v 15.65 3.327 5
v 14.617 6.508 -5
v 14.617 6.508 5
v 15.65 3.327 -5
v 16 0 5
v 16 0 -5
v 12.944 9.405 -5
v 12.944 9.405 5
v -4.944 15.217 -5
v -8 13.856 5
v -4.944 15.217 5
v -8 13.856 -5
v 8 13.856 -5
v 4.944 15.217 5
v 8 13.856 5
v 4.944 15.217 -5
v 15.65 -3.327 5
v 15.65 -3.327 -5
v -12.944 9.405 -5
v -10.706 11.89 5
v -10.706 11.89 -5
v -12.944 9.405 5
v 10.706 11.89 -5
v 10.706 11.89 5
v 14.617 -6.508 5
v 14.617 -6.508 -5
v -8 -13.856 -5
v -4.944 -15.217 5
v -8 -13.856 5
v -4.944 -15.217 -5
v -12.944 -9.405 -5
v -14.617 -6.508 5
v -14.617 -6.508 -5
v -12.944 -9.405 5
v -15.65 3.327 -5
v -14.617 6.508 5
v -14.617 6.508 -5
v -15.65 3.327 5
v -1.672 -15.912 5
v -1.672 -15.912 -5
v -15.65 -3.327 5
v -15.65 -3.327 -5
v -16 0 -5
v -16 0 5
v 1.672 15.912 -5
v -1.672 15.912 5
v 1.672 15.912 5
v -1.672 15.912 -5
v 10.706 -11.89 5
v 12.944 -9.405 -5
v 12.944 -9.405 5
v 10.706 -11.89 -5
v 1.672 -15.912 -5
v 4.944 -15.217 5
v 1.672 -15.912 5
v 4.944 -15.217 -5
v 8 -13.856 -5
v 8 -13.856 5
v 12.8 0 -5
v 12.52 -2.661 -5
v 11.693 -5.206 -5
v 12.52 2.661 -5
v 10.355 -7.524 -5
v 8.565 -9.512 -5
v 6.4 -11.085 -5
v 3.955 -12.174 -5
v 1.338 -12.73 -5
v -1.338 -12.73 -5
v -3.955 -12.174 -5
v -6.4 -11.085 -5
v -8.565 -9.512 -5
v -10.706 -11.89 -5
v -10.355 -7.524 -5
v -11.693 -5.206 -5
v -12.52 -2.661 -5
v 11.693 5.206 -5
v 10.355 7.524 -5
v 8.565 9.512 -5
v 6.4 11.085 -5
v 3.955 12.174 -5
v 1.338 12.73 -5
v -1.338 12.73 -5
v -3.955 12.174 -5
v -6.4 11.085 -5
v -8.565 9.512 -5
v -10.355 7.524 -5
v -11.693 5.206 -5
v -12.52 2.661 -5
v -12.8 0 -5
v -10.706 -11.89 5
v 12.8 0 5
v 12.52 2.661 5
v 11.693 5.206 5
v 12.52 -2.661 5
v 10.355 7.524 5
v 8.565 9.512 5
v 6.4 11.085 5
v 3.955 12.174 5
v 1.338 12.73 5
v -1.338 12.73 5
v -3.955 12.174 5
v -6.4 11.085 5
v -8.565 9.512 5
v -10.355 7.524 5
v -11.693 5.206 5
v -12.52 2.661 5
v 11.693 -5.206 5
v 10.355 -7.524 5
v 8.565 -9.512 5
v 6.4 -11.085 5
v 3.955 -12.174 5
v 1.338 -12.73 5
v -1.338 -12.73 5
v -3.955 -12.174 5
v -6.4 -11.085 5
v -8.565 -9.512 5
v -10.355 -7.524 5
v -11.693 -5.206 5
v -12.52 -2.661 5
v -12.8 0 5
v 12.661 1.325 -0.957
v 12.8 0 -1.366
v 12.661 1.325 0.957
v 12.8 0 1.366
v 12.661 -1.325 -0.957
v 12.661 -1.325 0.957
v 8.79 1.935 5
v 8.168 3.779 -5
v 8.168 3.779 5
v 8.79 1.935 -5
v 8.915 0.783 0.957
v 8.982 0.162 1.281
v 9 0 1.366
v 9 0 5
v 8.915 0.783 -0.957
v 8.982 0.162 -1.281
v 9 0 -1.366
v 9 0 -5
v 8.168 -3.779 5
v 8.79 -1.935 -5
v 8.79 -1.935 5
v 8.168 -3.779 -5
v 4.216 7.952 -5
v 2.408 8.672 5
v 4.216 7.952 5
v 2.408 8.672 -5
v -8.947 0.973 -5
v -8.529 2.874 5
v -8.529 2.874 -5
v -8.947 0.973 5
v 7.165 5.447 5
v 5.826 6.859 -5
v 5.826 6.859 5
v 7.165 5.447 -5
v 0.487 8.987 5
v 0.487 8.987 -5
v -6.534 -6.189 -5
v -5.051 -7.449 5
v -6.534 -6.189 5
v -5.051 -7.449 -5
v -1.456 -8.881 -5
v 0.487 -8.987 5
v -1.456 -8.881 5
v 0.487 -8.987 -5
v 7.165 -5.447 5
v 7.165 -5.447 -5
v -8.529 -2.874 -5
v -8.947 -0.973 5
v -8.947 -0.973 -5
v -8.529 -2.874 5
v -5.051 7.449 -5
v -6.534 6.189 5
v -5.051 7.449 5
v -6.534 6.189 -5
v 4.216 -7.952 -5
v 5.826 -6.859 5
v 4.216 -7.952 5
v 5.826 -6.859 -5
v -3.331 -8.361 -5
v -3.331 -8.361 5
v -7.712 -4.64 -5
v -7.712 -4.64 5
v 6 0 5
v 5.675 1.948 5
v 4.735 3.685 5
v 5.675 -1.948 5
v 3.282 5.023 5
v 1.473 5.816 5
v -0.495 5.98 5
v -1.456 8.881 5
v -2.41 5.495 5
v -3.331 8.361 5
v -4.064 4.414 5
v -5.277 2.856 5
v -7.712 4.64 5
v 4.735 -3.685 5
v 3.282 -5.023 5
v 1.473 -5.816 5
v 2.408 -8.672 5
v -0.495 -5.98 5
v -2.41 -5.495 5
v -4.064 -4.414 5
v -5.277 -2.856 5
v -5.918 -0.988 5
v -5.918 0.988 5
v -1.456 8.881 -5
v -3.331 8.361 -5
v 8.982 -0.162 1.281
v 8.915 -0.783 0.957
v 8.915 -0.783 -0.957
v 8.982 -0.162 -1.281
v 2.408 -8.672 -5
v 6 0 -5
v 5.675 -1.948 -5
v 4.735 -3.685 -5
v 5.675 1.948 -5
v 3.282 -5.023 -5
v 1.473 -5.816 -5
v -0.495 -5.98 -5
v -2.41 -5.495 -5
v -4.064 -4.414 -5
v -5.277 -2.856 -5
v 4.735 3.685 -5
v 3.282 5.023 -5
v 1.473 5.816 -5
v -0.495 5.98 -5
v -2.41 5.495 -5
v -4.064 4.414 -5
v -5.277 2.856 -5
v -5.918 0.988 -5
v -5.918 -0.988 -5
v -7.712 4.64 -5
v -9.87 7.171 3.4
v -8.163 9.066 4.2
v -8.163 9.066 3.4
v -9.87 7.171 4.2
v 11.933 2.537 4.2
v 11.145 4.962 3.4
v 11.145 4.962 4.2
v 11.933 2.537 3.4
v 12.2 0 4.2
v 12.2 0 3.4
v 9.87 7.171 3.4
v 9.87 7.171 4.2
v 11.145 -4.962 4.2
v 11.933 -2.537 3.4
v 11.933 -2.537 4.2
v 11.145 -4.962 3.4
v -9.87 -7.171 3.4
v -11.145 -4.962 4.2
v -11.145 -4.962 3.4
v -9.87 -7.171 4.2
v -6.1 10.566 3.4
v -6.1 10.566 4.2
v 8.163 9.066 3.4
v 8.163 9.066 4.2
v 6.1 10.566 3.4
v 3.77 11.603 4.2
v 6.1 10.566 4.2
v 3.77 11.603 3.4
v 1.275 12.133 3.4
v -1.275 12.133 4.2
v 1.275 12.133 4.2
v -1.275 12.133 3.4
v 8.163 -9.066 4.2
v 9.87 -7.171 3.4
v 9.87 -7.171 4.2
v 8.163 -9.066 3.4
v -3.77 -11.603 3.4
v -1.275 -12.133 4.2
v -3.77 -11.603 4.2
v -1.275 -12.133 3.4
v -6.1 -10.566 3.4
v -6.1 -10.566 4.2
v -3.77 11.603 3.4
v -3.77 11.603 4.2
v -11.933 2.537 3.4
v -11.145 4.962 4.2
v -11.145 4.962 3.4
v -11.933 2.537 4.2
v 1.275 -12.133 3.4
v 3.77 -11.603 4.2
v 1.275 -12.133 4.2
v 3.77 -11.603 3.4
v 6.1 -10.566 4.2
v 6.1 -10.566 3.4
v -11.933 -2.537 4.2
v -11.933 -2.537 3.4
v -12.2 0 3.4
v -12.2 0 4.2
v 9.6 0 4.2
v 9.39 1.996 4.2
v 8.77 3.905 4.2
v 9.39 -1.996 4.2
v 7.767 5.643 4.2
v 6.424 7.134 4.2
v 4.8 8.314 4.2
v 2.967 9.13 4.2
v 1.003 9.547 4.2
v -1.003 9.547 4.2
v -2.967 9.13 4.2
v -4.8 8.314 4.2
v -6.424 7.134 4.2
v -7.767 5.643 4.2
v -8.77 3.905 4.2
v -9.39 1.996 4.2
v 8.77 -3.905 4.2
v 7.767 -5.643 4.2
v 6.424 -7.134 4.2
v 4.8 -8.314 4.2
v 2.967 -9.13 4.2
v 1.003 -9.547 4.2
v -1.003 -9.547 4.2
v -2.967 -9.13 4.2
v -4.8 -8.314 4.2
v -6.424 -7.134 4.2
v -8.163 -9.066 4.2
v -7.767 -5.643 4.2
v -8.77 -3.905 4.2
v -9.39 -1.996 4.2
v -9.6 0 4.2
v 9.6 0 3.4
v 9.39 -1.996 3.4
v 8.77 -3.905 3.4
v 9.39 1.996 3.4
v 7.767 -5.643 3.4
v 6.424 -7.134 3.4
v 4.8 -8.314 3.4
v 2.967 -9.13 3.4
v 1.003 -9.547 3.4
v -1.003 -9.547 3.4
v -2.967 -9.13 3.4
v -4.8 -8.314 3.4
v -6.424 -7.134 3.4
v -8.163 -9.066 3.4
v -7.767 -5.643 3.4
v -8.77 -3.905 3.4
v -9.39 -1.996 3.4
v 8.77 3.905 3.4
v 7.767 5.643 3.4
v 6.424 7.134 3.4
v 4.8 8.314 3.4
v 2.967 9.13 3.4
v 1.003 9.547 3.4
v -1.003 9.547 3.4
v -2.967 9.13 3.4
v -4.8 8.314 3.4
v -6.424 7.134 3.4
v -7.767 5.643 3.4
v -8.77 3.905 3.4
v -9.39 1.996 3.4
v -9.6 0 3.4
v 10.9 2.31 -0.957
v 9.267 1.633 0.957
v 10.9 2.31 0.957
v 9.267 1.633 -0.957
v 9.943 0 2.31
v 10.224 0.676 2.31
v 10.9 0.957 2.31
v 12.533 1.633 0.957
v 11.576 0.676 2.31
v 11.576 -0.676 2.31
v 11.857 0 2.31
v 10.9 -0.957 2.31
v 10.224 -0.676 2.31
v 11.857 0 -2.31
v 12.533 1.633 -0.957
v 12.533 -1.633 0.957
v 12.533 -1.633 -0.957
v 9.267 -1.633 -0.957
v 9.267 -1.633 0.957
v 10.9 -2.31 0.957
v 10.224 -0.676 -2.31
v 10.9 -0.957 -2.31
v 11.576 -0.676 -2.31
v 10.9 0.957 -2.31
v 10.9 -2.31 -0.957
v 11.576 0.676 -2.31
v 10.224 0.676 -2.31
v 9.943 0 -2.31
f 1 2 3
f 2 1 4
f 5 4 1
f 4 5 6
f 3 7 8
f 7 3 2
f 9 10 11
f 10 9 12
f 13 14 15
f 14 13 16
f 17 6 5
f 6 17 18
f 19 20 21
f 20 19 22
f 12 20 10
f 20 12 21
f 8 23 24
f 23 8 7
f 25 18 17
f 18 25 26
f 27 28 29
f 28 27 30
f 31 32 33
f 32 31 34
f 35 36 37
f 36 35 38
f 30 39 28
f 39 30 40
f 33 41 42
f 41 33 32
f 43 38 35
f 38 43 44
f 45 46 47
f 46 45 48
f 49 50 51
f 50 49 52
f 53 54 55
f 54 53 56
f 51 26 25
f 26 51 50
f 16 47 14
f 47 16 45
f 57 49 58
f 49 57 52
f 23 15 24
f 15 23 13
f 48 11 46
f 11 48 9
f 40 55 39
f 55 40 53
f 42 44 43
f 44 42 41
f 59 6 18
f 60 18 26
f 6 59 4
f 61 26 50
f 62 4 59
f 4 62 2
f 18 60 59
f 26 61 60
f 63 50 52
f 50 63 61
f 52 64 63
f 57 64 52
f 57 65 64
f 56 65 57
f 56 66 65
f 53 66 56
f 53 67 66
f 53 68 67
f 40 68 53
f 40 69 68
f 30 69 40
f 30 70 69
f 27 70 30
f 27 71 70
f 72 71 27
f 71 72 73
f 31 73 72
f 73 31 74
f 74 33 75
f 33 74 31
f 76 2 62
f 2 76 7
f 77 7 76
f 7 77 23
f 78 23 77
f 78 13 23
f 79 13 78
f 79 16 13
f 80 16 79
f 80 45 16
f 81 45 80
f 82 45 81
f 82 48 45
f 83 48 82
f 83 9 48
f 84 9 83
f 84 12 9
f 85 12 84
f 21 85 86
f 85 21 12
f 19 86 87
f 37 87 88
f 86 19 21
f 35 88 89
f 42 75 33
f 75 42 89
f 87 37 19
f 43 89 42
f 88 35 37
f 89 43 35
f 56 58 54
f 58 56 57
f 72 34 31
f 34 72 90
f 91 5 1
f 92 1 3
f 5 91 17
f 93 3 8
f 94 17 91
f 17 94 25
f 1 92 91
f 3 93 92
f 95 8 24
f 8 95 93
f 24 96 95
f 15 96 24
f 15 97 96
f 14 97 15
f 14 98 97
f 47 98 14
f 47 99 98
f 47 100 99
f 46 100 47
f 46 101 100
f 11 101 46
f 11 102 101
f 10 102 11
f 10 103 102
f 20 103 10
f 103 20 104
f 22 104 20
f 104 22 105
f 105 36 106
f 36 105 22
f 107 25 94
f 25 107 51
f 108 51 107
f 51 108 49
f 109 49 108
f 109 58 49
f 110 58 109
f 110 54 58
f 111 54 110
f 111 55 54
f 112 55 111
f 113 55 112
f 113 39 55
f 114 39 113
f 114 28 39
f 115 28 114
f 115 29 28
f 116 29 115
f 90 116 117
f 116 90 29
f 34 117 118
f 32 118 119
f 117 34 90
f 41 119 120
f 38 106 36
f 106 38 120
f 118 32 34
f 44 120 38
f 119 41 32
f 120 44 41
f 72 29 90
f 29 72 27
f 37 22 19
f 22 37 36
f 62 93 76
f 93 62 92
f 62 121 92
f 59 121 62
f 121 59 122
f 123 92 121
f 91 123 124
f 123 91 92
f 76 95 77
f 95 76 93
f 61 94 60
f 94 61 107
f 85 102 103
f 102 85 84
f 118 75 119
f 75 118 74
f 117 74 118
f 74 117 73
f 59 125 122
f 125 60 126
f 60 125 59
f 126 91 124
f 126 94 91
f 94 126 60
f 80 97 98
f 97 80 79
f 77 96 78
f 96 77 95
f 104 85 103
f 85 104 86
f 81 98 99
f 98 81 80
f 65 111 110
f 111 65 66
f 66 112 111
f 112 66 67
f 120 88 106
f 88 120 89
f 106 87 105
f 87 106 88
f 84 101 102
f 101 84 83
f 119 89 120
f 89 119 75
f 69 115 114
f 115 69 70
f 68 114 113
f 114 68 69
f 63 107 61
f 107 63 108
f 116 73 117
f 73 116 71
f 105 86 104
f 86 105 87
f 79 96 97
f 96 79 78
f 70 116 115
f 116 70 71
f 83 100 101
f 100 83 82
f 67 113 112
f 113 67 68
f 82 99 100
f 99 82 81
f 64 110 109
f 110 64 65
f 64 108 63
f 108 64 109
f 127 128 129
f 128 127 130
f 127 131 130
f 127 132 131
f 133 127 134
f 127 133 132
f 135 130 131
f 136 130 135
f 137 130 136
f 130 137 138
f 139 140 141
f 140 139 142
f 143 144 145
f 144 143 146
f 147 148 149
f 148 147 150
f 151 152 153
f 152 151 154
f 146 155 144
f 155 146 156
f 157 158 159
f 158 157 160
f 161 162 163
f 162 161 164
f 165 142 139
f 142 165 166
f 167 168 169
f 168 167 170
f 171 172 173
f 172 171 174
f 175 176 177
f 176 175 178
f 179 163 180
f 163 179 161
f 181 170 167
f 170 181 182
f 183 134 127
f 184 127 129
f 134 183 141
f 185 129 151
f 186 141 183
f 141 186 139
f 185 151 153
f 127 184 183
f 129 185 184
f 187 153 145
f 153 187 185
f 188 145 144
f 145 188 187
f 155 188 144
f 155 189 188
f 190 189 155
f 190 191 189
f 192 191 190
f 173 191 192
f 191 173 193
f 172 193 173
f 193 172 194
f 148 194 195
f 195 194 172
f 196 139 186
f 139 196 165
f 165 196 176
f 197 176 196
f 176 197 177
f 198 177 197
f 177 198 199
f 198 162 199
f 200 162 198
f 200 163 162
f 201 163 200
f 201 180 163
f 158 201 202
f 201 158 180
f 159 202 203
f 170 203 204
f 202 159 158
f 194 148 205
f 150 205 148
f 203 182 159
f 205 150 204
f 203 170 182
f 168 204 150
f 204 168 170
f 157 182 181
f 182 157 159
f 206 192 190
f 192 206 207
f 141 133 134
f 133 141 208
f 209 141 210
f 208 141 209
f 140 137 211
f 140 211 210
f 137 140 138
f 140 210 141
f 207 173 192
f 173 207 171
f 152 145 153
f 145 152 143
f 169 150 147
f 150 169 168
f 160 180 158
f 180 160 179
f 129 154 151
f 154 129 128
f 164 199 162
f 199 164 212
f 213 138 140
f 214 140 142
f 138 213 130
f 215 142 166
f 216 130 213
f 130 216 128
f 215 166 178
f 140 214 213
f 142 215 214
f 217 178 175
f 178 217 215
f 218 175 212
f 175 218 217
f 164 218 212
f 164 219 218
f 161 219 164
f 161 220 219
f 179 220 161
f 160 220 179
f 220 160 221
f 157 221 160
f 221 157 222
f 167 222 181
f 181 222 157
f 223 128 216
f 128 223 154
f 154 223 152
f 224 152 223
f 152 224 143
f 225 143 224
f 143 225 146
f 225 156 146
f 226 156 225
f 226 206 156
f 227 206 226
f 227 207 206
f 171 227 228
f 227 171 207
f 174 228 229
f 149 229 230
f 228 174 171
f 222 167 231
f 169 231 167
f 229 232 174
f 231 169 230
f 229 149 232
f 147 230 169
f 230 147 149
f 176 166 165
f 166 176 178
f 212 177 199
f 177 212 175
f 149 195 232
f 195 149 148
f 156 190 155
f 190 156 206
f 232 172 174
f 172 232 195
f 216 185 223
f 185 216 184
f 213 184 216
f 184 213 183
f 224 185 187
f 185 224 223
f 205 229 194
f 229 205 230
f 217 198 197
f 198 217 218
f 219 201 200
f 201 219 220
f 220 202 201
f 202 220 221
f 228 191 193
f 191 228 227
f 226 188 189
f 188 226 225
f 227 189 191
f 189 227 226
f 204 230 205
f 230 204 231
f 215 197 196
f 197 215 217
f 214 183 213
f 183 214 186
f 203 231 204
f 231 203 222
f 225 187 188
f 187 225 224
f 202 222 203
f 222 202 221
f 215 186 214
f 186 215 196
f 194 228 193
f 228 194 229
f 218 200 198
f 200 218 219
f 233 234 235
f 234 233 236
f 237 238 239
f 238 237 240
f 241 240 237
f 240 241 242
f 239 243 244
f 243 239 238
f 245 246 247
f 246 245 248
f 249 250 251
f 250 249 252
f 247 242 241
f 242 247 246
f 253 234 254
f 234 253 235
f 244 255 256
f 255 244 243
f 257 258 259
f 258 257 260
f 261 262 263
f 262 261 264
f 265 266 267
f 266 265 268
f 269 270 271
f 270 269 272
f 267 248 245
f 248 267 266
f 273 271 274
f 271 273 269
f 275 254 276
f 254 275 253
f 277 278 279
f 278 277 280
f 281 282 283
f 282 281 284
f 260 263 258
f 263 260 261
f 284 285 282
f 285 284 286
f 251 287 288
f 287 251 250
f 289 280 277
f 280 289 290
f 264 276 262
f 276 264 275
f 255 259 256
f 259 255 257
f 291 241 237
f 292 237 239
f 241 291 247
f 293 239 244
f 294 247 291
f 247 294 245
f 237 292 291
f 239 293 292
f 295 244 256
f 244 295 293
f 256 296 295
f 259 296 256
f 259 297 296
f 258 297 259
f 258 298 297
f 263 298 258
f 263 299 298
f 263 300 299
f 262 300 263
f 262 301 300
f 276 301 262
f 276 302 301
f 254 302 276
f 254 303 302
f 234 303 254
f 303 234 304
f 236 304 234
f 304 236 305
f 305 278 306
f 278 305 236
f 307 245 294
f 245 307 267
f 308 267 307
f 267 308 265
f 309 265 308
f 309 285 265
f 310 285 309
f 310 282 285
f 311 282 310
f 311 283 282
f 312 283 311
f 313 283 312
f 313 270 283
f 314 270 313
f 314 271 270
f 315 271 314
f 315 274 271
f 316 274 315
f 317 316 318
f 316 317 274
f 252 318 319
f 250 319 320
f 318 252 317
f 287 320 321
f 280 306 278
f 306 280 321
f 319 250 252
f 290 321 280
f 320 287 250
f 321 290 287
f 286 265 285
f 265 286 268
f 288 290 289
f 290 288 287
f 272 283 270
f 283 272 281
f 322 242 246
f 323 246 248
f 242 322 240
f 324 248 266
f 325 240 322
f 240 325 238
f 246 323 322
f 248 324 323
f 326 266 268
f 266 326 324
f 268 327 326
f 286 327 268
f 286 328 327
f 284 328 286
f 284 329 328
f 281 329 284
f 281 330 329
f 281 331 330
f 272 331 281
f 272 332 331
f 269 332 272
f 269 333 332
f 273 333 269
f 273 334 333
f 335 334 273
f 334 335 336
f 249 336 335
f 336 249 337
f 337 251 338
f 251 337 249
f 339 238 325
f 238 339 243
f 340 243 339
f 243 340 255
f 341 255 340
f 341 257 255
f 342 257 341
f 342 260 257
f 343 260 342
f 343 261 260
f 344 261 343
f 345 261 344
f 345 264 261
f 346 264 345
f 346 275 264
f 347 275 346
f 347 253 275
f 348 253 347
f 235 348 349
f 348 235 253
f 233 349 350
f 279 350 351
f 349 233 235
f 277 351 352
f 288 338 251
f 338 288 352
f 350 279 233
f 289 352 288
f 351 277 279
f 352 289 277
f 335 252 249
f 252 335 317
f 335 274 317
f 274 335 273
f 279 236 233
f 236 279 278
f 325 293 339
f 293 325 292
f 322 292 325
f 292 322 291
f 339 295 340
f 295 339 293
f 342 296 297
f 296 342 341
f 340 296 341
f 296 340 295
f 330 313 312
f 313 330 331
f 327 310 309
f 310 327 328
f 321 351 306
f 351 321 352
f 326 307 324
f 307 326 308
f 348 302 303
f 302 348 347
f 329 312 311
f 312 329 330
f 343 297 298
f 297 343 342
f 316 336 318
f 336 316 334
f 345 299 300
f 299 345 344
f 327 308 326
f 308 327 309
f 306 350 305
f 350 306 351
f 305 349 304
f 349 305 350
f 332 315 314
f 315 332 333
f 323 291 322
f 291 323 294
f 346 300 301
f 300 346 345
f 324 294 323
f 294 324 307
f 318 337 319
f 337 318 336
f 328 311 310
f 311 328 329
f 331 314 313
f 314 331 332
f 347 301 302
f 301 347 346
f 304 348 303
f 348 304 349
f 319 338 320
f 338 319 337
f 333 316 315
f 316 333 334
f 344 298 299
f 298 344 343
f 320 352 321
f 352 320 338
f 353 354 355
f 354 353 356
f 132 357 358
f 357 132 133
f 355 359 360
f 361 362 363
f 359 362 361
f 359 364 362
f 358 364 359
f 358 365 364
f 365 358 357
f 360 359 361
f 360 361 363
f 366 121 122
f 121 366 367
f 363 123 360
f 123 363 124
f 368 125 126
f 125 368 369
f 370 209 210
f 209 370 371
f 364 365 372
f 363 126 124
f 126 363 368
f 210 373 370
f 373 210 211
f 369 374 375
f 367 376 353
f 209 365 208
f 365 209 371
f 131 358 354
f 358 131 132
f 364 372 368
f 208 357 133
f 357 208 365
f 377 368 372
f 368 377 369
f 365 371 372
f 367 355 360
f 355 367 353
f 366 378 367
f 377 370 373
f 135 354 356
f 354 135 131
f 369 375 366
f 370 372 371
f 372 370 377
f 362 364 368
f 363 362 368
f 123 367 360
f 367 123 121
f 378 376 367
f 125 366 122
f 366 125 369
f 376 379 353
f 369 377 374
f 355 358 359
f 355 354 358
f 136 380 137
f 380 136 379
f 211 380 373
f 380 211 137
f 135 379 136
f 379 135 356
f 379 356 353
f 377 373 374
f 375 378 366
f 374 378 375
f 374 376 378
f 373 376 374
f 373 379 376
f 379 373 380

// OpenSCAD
// Parameters
bore_diameter_mm = 12; //[6:24:0.5]
outer_diameter_mm = 32; //[16:64:0.5]
width_mm = 10; //[5:20:0.5]
bore_radius_mm = 6; //[3:12:0.5]
outer_radius_mm = 16; //[8:32:0.5]
eps_mm = 0.8; //[0.2:2:0.1]
rim_radial_thickness_mm = 3.2; //[1.6:6.4:0.1]
hub_radial_thickness_mm = 3; //[1.5:6:0.1]
shield_thickness_mm = 0.8; //[0.4:1.6:0.1]
shield_radial_clearance_mm = 0.6; //[0.2:1.5:0.1]
ball_diameter_mm = 5; //[3:8:0.1]

// Outer Ring
module outer_ring() {
  color("Silver") difference() {
    cylinder(r=outer_radius_mm, h=width_mm, center=true);
    cylinder(r=outer_radius_mm - rim_radial_thickness_mm, h=width_mm + 2*eps_mm, center=true);
  }
}

// Inner Ring
module inner_ring() {
  color("DimGray") difference() {
    cylinder(r=bore_radius_mm + hub_radial_thickness_mm, h=width_mm, center=true);
    cylinder(r=bore_radius_mm, h=width_mm + 2*eps_mm, center=true);
  }
}

// Shield or Seal
module shield_or_seal() {
  color("Black") difference() {
    translate([0, 0, width_mm/2 - shield_thickness_mm/2 - eps_mm])
      cylinder(r=outer_radius_mm - rim_radial_thickness_mm - shield_radial_clearance_mm, h=shield_thickness_mm, center=true);
    translate([0, 0, width_mm/2 - shield_thickness_mm/2 - eps_mm])
      cylinder(r=bore_radius_mm + hub_radial_thickness_mm + shield_radial_clearance_mm, h=shield_thickness_mm + 2*eps_mm, center=true);
  }
}

// Bearing Ball
module bearing_ball() {
  color("Copper") translate([bore_radius_mm + hub_radial_thickness_mm + ((outer_radius_mm - rim_radial_thickness_mm) - (bore_radius_mm + hub_radial_thickness_mm))/2, 0, 0])
    sphere(r=ball_diameter_mm/2);
}

// Ball Bearing Assembly
module ball_bearing() {
  union() {
    outer_ring();
    inner_ring();
    shield_or_seal();
    bearing_ball();
  }
}

// Final Assembly
module assembly() {
  ball_bearing();
}

assembly();
